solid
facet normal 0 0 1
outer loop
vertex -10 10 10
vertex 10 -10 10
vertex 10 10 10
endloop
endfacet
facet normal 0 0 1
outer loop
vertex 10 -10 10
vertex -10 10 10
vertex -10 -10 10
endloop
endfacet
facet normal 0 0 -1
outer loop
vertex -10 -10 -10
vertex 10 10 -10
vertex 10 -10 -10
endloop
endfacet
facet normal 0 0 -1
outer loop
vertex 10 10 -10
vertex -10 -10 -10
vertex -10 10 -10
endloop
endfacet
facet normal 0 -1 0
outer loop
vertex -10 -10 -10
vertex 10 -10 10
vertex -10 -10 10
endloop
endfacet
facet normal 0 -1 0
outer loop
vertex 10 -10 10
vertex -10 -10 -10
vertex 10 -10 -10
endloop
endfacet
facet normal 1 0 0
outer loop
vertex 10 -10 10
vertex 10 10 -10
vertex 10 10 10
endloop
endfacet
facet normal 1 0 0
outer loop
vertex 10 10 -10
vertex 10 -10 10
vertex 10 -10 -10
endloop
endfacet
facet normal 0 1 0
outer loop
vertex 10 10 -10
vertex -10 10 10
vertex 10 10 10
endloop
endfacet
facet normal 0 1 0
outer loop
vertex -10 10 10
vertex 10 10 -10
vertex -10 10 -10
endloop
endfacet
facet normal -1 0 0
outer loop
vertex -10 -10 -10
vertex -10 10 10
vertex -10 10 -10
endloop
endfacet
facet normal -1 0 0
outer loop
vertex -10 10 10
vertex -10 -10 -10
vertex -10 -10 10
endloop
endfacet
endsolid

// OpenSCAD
//sphere(10);
//cube([20, 20, 20]);




hoogte = 15;

//module zandloper(het){
//    
//cylinder(r1=10, r2=5, h=het);
//translate([0, 0, 5])
//    cylinder(r1=5, r2=10, h=het);
//
//}
//translate([-20, 0, 0])  
//    zandloper(30);
//
//translate([20, 0, 0])  
//    zandloper(5);

module snaarwiel(doorsnede, het, gat){
    difference(){
        union(){        
            cylinder(r1=doorsnede/2+3, r2=doorsnede/2, h=het);
            translate([0, 0, het])
                cylinder(r1=doorsnede/2, r2=doorsnede/2+3, h=het);
        }
        cylinder(r=gat/2, h=hoogte*2);
    }

}
//snaarwiel(25, 5, 5, $fn=100);

//cylinder(r=10, h=8, $fn=8);

cube([20, 20,20], center=true);
